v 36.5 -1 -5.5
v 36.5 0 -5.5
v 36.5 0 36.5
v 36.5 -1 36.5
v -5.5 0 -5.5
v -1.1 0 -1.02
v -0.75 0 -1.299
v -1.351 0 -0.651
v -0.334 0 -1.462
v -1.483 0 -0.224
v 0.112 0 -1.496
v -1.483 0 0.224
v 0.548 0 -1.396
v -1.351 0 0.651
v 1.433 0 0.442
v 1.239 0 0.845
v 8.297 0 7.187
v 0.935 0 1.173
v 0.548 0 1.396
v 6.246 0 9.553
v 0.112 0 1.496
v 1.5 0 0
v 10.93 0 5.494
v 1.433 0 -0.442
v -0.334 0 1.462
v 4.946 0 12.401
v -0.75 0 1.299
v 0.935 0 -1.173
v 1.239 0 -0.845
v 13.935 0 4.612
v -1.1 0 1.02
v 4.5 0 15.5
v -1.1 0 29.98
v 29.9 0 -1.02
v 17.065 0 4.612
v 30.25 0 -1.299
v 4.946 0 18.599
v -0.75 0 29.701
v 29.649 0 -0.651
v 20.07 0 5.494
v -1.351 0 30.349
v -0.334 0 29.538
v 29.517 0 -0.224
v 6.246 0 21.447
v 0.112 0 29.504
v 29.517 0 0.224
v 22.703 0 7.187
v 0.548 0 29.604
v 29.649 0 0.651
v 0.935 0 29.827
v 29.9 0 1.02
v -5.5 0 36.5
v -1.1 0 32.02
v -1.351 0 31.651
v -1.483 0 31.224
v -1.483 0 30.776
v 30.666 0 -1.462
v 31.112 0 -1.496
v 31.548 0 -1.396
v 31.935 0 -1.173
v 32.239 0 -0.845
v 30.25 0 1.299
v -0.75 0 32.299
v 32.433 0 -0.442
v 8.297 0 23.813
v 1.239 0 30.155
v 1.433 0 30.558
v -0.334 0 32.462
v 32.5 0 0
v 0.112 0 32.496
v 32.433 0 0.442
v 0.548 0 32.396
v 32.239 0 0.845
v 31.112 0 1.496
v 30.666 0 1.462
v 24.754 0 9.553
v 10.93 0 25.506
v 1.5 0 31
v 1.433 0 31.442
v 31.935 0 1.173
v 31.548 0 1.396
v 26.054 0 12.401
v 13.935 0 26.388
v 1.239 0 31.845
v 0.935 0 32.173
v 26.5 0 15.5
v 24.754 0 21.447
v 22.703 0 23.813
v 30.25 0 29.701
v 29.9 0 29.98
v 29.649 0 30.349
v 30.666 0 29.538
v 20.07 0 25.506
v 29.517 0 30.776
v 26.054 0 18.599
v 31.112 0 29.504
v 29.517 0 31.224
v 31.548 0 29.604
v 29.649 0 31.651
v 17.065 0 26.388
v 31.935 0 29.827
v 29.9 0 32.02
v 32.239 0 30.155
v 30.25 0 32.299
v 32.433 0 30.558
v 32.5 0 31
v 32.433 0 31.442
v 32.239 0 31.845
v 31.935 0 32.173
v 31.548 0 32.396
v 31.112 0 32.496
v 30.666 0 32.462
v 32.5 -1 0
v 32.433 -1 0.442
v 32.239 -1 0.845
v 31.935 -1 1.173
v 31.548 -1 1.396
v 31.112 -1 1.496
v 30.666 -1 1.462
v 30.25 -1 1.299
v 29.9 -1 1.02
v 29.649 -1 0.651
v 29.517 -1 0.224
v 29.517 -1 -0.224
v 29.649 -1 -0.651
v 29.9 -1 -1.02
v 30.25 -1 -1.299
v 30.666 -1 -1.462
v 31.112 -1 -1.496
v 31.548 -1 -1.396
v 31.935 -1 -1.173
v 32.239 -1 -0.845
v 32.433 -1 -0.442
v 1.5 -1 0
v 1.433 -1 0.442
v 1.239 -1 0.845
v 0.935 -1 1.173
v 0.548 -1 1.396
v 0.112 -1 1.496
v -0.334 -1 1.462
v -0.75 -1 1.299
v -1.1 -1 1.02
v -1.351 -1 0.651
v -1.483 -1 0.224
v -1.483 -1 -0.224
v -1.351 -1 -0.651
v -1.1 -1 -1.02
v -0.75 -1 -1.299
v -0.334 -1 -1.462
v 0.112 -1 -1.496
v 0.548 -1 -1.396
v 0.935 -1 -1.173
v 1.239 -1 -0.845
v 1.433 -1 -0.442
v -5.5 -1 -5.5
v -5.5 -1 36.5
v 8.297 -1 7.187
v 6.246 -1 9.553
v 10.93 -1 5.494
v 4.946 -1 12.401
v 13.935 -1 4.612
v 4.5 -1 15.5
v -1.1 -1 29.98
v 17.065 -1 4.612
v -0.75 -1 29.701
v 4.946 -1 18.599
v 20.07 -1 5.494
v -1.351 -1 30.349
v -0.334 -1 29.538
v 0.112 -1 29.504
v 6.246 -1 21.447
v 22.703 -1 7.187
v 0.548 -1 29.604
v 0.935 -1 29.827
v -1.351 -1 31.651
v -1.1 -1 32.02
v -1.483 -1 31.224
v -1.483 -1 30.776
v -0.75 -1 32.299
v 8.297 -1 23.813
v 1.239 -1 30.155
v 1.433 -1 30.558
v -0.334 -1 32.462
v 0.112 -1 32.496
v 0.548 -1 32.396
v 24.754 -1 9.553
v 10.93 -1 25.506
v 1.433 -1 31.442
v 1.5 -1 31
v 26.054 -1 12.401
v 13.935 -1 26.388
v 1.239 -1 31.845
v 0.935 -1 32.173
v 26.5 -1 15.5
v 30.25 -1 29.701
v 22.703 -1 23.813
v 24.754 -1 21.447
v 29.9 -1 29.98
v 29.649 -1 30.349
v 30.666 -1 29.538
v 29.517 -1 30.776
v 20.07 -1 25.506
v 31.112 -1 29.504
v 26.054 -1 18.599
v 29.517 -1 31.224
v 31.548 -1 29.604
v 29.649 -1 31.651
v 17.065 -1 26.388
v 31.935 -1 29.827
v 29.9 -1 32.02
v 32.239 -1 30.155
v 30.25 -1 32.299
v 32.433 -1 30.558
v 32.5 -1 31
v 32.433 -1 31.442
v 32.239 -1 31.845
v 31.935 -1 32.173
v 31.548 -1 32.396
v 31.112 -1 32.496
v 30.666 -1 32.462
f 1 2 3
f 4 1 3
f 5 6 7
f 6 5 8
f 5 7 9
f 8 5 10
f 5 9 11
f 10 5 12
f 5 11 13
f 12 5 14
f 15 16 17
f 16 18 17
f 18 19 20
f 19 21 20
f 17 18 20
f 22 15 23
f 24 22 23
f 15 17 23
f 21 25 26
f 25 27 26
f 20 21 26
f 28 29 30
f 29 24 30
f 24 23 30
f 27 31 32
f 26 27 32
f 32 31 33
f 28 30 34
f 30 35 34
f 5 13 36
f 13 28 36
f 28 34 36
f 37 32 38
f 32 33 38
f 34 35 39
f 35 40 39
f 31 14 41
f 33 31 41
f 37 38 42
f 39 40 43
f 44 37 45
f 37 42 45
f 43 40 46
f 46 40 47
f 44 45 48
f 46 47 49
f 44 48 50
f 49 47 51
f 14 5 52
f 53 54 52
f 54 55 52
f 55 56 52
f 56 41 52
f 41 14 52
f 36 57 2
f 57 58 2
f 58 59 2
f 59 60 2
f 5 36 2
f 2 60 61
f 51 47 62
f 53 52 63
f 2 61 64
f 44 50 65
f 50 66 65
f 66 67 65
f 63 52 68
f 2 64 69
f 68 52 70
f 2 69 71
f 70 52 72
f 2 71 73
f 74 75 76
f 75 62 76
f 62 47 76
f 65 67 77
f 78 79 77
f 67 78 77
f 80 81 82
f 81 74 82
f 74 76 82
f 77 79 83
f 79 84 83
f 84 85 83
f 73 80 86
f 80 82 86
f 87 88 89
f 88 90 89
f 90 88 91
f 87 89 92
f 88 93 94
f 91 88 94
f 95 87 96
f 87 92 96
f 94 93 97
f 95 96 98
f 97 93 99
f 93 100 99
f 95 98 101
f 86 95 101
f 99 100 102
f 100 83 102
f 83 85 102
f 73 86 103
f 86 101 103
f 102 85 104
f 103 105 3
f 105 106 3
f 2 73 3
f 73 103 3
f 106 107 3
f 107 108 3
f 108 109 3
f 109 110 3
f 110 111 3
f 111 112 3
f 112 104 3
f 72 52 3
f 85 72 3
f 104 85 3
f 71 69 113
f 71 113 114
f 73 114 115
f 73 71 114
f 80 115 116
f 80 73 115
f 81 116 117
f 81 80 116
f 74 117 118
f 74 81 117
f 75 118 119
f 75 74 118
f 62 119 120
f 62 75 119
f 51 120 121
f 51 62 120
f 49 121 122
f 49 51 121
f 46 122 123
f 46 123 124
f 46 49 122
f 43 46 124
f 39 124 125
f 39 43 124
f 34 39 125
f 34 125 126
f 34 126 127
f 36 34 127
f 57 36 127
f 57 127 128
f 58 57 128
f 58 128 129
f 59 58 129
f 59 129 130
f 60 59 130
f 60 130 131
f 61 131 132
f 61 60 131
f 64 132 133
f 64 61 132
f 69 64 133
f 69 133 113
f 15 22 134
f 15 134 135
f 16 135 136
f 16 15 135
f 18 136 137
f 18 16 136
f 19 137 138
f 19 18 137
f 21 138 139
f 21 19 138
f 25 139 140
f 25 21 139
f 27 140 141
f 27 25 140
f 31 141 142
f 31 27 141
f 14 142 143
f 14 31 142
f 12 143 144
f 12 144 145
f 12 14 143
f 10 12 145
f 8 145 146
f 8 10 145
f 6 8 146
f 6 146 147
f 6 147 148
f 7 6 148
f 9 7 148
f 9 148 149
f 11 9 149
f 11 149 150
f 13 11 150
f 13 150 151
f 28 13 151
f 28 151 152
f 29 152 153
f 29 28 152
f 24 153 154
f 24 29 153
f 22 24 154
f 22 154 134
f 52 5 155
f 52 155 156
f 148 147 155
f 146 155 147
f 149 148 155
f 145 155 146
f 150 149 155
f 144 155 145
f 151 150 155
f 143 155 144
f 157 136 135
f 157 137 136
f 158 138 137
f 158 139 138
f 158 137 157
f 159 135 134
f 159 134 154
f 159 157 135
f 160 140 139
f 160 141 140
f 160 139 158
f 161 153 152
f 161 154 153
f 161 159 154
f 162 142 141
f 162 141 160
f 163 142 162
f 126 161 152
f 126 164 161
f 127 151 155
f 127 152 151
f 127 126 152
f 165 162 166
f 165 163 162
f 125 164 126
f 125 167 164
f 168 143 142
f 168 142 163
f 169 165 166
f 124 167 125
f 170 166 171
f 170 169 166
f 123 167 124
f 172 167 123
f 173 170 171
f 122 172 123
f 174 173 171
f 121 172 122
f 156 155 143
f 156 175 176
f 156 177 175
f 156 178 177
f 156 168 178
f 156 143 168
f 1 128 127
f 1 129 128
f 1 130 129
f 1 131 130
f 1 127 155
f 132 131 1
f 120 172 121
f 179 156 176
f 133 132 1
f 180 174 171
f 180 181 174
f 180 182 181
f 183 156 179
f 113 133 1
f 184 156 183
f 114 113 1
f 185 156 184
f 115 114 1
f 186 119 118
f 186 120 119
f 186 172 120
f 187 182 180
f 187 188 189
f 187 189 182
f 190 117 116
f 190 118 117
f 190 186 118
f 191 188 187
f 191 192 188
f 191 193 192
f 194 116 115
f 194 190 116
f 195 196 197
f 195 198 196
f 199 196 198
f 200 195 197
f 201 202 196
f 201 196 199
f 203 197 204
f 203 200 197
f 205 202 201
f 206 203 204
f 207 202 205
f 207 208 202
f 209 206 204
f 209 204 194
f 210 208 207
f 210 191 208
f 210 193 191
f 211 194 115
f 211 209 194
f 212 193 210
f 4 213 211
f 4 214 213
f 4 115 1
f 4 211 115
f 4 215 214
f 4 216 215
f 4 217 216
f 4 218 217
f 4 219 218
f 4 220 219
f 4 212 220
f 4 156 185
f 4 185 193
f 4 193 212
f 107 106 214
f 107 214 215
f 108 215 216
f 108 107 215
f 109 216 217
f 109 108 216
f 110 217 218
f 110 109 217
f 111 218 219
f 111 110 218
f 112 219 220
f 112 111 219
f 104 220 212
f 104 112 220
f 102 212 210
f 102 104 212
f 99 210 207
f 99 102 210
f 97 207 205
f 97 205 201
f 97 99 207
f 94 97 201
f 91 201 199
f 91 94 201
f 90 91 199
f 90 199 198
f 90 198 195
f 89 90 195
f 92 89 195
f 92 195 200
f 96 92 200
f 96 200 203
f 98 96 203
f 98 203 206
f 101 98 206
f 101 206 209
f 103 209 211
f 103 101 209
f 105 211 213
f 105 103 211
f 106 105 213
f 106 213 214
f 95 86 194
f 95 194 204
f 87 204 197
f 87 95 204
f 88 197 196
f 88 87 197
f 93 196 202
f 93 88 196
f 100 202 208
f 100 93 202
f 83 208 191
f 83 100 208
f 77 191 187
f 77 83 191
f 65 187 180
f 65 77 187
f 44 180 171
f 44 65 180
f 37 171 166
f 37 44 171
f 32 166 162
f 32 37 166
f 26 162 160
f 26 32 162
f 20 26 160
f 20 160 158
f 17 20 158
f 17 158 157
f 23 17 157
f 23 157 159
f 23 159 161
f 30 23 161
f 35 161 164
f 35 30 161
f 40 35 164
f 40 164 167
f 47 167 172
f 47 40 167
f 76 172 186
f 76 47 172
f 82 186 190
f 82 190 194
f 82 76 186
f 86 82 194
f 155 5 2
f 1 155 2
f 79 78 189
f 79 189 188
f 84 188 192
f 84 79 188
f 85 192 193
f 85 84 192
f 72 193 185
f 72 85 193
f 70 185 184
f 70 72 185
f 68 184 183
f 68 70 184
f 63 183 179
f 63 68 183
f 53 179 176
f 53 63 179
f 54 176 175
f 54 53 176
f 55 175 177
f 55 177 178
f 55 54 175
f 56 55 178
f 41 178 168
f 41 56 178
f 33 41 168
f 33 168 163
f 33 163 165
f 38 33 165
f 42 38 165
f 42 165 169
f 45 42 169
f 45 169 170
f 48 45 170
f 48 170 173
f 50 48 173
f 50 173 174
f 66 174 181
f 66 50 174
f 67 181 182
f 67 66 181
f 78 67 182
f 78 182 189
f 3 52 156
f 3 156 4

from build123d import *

# Parameters (mm, degrees)
F0_W     = 42
F0_H     = 42
F0_R     = 1.5
F0_R_2   = 11
F1_DEPTH = 1


with BuildPart() as f1:
    # F0 (on Front) → F1 (new body)
    with BuildSketch(Plane.XZ):
        with Locations((15.5, 15.5)):
            Rectangle(F0_W, F0_H)
        Circle(F0_R, mode=Mode.SUBTRACT)
        with Locations((31, 0)):
            Circle(F0_R, mode=Mode.SUBTRACT)
        with Locations((0, 31)):
            Circle(F0_R, mode=Mode.SUBTRACT)
        with Locations((15.5, 15.5)):
            Circle(F0_R_2, mode=Mode.SUBTRACT)
        with Locations((31, 31)):
            Circle(F0_R, mode=Mode.SUBTRACT)
    extrude(amount=F1_DEPTH)


solid = f1.part
